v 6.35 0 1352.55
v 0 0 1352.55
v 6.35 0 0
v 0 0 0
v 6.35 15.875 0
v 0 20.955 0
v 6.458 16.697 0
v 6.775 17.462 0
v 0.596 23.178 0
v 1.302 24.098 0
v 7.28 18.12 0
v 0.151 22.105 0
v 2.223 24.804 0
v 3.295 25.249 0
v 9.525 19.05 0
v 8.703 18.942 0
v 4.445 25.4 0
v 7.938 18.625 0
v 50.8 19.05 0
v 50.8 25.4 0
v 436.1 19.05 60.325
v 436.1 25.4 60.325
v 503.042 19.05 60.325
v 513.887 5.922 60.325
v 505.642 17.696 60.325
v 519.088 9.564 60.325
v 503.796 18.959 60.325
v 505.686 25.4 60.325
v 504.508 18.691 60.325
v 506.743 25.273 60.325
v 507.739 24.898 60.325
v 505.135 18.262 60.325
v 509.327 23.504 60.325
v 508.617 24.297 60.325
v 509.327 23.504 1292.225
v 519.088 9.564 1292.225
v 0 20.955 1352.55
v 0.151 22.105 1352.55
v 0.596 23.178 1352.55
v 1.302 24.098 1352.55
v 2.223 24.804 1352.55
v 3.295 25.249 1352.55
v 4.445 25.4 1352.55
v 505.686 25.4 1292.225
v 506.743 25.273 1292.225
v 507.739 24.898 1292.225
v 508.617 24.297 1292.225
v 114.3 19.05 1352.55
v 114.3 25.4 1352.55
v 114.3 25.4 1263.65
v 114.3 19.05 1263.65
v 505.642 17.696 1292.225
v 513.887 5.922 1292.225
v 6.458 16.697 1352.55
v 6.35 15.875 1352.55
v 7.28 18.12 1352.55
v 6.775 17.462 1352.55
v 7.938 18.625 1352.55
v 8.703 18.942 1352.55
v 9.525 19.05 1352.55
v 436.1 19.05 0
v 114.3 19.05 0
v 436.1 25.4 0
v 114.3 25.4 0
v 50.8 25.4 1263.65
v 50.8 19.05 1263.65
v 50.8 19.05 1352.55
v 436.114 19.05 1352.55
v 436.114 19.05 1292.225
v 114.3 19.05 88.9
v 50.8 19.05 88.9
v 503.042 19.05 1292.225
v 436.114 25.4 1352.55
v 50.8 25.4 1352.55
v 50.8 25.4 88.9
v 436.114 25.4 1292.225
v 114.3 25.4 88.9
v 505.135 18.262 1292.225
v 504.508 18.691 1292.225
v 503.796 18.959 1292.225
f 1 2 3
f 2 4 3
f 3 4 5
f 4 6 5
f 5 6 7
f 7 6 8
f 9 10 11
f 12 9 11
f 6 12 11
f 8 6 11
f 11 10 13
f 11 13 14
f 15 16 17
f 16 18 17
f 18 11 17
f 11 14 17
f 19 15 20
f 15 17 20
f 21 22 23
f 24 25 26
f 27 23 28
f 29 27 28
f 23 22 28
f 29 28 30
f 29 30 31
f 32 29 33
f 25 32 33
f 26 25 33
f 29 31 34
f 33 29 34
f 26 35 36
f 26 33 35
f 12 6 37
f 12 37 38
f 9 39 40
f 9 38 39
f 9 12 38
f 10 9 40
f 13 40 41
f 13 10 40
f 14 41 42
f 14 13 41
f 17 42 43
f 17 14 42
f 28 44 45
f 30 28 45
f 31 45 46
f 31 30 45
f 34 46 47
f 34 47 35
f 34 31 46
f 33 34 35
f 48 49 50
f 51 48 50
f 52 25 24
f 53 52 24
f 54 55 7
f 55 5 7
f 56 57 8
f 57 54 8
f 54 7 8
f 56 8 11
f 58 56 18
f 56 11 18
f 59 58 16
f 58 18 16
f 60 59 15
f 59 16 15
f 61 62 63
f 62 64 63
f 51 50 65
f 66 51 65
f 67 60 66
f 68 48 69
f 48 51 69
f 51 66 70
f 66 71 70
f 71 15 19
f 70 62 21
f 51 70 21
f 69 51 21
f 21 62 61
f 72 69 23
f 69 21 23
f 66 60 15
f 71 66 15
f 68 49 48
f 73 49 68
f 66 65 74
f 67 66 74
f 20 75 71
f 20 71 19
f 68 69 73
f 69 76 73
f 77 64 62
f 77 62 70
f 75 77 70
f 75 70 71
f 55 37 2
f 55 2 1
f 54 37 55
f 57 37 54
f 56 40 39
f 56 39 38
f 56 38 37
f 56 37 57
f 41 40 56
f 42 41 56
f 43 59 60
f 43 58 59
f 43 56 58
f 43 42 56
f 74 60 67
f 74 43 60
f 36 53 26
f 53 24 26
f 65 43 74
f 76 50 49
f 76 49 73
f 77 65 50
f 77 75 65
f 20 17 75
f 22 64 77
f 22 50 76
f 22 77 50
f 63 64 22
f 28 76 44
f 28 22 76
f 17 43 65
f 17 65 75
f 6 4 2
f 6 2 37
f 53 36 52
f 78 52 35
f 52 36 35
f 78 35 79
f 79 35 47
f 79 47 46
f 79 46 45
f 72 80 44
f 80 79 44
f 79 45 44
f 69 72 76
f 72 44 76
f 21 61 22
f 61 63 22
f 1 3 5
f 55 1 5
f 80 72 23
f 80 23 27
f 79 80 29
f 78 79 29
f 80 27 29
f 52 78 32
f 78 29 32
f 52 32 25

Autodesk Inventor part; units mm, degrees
ref_plane "YZ Plane" through (0, 0, 0) normal (1, 0, 0) x (0, 1, 0)
ref_plane "XZ Plane" through (0, 0, 0) normal (0, 1, 0) x (-1, 0, 0)
ref_plane "XY Plane" through (0, 0, 0) normal (0, 0, 1) x (1, 0, 0)
sketch "Sketch1" plane through (0, 0, 0) normal (0, 0, 1) x (1, 0, 0)
  line L0 (0, 0) -> (0, 20.955)
  line L1 (4.445, 25.4) -> (505.6861, 25.4)
  line L2 (0, 0) -> (6.35, 0)
  line L3 (6.35, 0) -> (6.35, 15.875)
  line L4 (9.525, 19.05) -> (503.0416, 19.05)
  arc A0 (9.525, 19.05) -> (6.35, 15.875) centre (9.525, 15.875) ccw
  arc A1 (4.445, 25.4) -> (0, 20.955) centre (4.445, 20.955) ccw
  line L5 (509.3272, 23.5045) -> (519.0883, 9.5642)
  line L6 (505.6424, 17.6961) -> (513.8867, 5.922)
  arc A2 (509.3272, 23.5045) -> (505.6861, 25.4) centre (505.6861, 20.955) ccw
  arc A3 (505.6424, 17.6961) -> (503.0416, 19.05) centre (503.0416, 15.875) ccw
  line L7 (513.8867, 5.922) -> (519.0883, 9.5642)
  point P0 (0, 25.4)
  point P1 (508, 25.4)
  point P2 (0, 22.225)
  point P3 (3.175, 25.4)
  dimension "d0" = 508
  dimension "d1" = 25.4
  dimension "d2" = 6.35
  dimension "d3" = 6.35
  dimension "d26" = 90
  dimension "d33" = 4.445
  dimension "d35" = 6.35
  dimension "d36" = 125
  dimension "d37" = 4.445
  dimension "d38" = 3.175
  dimension "d41" = 17.018
extrude "Extrusion4" add sketch "Sketch1" along normal blind 1352.55
sketch "Sketch4" plane through (4.445, 25.4, 0) normal (0, 1, 0) x (1, 0, 0)
  line L0 (0, -1352.55) -> (501.2411, -1352.55) projected
  line L1 (0, 0) -> (501.2411, 0) projected
  line L2 (-4.445, 0) -> (-4.445, -1352.55) projected
  line L3 (514.6433, 0) -> (514.6433, -1352.55) projected
  line L4 (46.355, 0) -> (109.855, 0)
  line L5 (109.855, 0) -> (109.855, -88.9)
  line L6 (109.855, -88.9) -> (46.355, -88.9)
  line L7 (46.355, -88.9) -> (46.355, 0)
  line L8 (46.355, -1352.55) -> (109.855, -1352.55)
  line L9 (109.855, -1352.55) -> (109.855, -1263.65)
  line L10 (109.855, -1263.65) -> (46.355, -1263.65)
  line L11 (46.355, -1263.65) -> (46.355, -1352.55)
  dimension "d44" = 63.5
  dimension "d45" = 88.9
  dimension "d46" = 50.8
  dimension "d47" = 88.9
  dimension "d48" = 50.8
  dimension "d49" = 63.5
extrude "Extrusion5" cut sketch "Sketch4" against normal blind 12.7
sketch "Sketch5" plane through (505.6861, 25.4, 1352.55) normal (0, 1, 0) x (1, 0, 0)
  line L0 (-391.3861, 0) -> (0, 0) projected
  line L1 (-391.3861, 1352.55) -> (0, 1352.55) projected
  line L2 (13.4023, 1352.55) -> (13.4023, 0) projected
  line L3 (-69.5716, 0) -> (14.7564, 0)
  line L4 (14.7564, 0) -> (14.7564, 60.325)
  line L5 (14.7564, 60.325) -> (-69.5716, 60.325)
  line L6 (-69.5716, 60.325) -> (-69.5716, 0)
  line L7 (14.7422, 1352.55) -> (-69.5858, 1352.55)
  line L8 (-69.5858, 1352.55) -> (-69.5858, 1292.225)
  line L9 (-69.5858, 1292.225) -> (14.7422, 1292.225)
  line L10 (14.7422, 1292.225) -> (14.7422, 1352.55)
  point P0 (-505.6861, 1352.55)
  dimension "d52" = 84.328
  dimension "d53" = 60.325
  dimension "d55" = 60.325
  dimension "d56" = 84.328
extrude "Extrusion6" cut sketch "Sketch5" against normal blind 50.8
properties part number "GE-12060"
